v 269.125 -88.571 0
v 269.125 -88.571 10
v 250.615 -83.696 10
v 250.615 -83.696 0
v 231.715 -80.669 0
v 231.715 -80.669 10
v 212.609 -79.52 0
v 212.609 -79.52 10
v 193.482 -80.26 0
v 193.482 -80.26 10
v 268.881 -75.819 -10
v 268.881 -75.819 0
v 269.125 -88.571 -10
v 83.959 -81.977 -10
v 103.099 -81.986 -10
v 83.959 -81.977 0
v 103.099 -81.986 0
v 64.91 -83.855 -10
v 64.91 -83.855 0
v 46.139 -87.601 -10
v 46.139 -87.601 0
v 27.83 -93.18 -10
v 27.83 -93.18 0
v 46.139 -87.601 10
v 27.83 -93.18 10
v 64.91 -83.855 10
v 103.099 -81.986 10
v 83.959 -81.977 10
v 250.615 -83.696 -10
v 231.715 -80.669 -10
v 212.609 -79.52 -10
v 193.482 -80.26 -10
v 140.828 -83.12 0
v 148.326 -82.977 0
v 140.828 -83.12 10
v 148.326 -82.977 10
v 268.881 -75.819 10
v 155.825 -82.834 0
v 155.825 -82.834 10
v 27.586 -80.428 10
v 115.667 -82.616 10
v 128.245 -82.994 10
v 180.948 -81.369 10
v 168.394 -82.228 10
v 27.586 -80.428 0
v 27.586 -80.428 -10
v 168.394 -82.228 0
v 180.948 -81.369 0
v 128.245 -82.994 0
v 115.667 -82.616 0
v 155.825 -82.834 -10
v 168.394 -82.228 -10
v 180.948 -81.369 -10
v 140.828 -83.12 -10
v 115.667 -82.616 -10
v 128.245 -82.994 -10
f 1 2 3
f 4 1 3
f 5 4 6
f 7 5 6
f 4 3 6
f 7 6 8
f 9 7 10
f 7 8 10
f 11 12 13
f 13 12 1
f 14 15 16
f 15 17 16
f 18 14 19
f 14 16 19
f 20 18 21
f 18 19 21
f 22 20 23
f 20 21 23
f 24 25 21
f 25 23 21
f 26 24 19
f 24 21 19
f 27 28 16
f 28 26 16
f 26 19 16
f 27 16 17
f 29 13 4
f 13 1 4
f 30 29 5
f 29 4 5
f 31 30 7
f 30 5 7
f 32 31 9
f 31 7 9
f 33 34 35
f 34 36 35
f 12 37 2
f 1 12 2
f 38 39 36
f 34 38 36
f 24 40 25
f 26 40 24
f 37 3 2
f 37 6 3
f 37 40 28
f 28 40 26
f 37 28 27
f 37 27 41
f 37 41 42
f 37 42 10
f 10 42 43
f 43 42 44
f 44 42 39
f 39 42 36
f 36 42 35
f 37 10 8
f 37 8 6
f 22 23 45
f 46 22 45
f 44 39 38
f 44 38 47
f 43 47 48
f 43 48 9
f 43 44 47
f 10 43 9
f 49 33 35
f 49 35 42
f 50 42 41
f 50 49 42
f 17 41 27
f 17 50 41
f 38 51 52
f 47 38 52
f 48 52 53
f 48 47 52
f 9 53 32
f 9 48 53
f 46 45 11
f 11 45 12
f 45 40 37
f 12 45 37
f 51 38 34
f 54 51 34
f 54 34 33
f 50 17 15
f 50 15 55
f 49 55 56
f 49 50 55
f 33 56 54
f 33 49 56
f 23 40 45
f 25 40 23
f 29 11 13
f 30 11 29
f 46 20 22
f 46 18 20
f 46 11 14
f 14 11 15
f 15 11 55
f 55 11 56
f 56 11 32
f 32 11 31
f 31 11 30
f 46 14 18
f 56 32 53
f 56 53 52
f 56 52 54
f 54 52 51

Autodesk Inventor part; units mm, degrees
ref_plane "YZ Plane" through (0, 0, 0) normal (1, 0, 0) x (0, 1, 0)
ref_plane "XZ Plane" through (0, 0, 0) normal (0, 1, 0) x (-1, 0, 0)
ref_plane "XY Plane" through (0, 0, 0) normal (0, 0, 1) x (1, 0, 0)
sketch "Sketch1" plane through (0, 0, 0) normal (0, 0, 1) x (1, 0, 0)
  line L0 (0, 0) -> (293.4944, 0) construction
  line L1 (293.4944, 0) -> (293.4944, -132.0217) construction
  line L2 (293.4944, -132.0217) -> (0, -132.0217) construction
  line L3 (0, -132.0217) -> (0, 0) construction
  line L4 (79.3681, -56.3049) -> (159.3681, -56.3049) construction
  line L5 (283.1562, -93.1287) -> (274.2161, -88.6482) construction
  line L6 (283.1562, -93.1287) -> (282.3201, -93.1287) construction
  line L7 (18.3483, -97.5091) -> (27.4302, -93.3236) construction
  line L8 (18.3483, -97.5091) -> (20.5956, -97.5091) construction
  arc A0 (103.0994, -81.9859) -> (27.4302, -93.3236) centre (93.4367, -275.677) ccw
  arc A1 (274.2161, -88.6482) -> (204.4098, -79.893) centre (217.7822, -255.937) ccw
  arc A2 (103.0994, -81.9859) -> (204.4098, -79.893) centre (140.8276, 544.7964) ccw
  line L9 (27.4302, -93.3236) -> (27.4302, -72.2735)
  line L10 (27.4302, -72.2735) -> (272.6166, -67.591)
  line L11 (272.6166, -67.591) -> (274.2161, -88.6482)
  line L12 (103.0994, -81.9859) -> (86.3195, -71.1488) construction
  line L13 (204.4098, -79.893) -> (220.9707, -68.5773) construction
  line L14 (86.3195, -71.1488) -> (86.3195, -81.1488) construction
  line L15 (86.3195, -81.1488) -> (103.0994, -81.9859) construction
  line L16 (220.9707, -68.5773) -> (221.7303, -78.5773) construction
  line L17 (221.7303, -78.5773) -> (204.4098, -79.893) construction
  dimension "d5" = 80
  dimension "d85" = 10
  dimension "d87" = 26.619
  dimension "d92" = 10
  dimension "d94" = 24.743
  dimension "d100" = 22.985
  dimension "d101" = 22.755
  dimension "d106" = 10
  dimension "d111" = 10
  dimension "d112" = 30
  dimension "d113" = 30
extrude "Extrusion1" add sketch "Sketch1" along normal blind 10
sketch "Sketch2" plane through (0, 0, 10) normal (0, 0, 1) x (1, 0, 0)
  arc A0 (103.0994, -81.9859) -> (204.4098, -79.893) centre (140.8276, 544.7964) ccw projected
  line L0 (272.6166, -67.591) -> (27.4302, -72.2735) projected
  line L1 (27.4302, -72.2735) -> (27.4302, -93.3236) projected
  line L2 (274.2161, -88.6482) -> (272.6166, -67.591) projected
  line L3 (125.3768, -83.1204) -> (158.7723, -83.1204)
  line L4 (140.8276, -83.1204) -> (140.8276, -70.1078)
  line L5 (140.8276, -76.6141) -> (27.4302, -76.6141)
  line L6 (140.8276, -76.6141) -> (273.302, -76.6141)
  arc A1 (274.2161, -88.6482) -> (204.4098, -79.893) centre (217.7822, -255.937) ccw projected
  line L7 (274.2161, -88.6482) -> (272.6166, -67.591) projected
  line L8 (272.6166, -67.591) -> (27.4302, -72.2735) projected
  line L9 (27.4302, -72.2735) -> (27.4302, -93.3236) projected
  arc A2 (103.0994, -81.9859) -> (27.4302, -93.3236) centre (93.4367, -275.677) ccw projected
  arc A3 (103.0994, -81.9859) -> (204.4098, -79.893) centre (140.8276, 544.7964) ccw projected
  line L10 (140.8276, -83.1204) -> (140.4575, -63.7401)
  point P0 (0, 0)
  point P1 (204.4098, -79.893)
  point P2 (140.5792, -70.1126)
  point P3 (140.7034, -76.6141)
  dimension "d121" = 113.3974
  dimension "d122" = 132.4743
extrude "Extrusion2" cut sketch "Sketch2" against normal blind 10 contours L4 L6 L2 A1 A0 | L10 L5 L4 | L5 L10 L0 L4 | L4 L0 L2 L6
sketch "Sketch4" plane through (0, 0, 10) normal (0, 0, 1) x (1, 0, 0)
  line L0 (140.5792, -70.1126) -> (27.4302, -72.2735) projected
  line L1 (27.4302, -72.2735) -> (27.4302, -93.3236) projected
  arc A0 (103.0994, -81.9859) -> (27.4302, -93.3236) centre (93.4367, -275.677) ccw projected
  arc A1 (103.0994, -81.9859) -> (140.8276, -83.1204) centre (140.8276, 544.7964) ccw projected
  line L2 (27.4302, -72.2735) -> (27.4302, -93.3236) projected
  arc A2 (103.0994, -81.9859) -> (27.4302, -93.3236) centre (93.4367, -275.677) ccw projected
  line L3 (27.4302, -72.2735) -> (27.8295, -93.1796)
  line L4 (140.8276, -83.1204) -> (140.5792, -70.1126) projected
  point P0 (0, 0)
  point P1 (253.7282, -67.9517)
  dimension "d128" = 90
extrude "Extrusion4" cut sketch "Sketch4" against normal blind 10 contours L3 A0 L1
sketch "Sketch6" plane through (0, 0, 10) normal (0, 0, 1) x (1, 0, 0)
  line L0 (27.4302, -72.2735) -> (27.8295, -93.1796) projected
  arc A0 (103.0994, -81.9859) -> (27.8295, -93.1796) centre (93.4367, -275.677) ccw projected
  arc A1 (103.0994, -81.9859) -> (140.8276, -83.1204) centre (140.8276, 544.7964) ccw projected
  line L1 (140.8276, -83.1204) -> (140.5792, -70.1126) projected
  line L2 (140.5792, -70.1126) -> (27.4302, -72.2735) projected
  line L3 (140.5792, -70.1126) -> (27.4302, -72.2735) projected
  line L4 (140.5792, -70.1126) -> (148.0778, -69.9694)
  line L5 (148.0778, -69.9694) -> (148.3263, -82.9772)
  line L6 (140.5792, -70.1126) -> (140.8276, -83.1204) projected
  line L7 (148.3263, -82.9772) -> (140.8276, -83.1204)
  point P0 (0, 0)
  dimension "d131" = 7.5
  dimension "d132" = 0
  dimension "d135" = 180
extrude "Extrusion5" add sketch "Sketch6" against normal blind 10 contours L4 L5 L7 L1
sketch "Sketch7" plane through (0, 0, 10) normal (0, 0, 1) x (1, 0, 0)
  line L0 (27.4302, -72.2735) -> (27.8295, -93.1796) projected
  arc A0 (103.0994, -81.9859) -> (27.8295, -93.1796) centre (93.4367, -275.677) ccw projected
  arc A1 (103.0994, -81.9859) -> (140.8276, -83.1204) centre (140.8276, 544.7964) ccw projected
  line L1 (140.8276, -83.1204) -> (148.3263, -82.9772) projected
  line L2 (148.3263, -82.9772) -> (148.0778, -69.9694) projected
  line L3 (148.0778, -69.9694) -> (27.4302, -72.2735) projected
  line L4 (268.7255, -67.6653) -> (269.1247, -88.5714)
  arc A2 (269.1247, -88.5714) -> (193.4823, -80.2598) centre (210.5334, -273.4407) ccw
  arc A3 (155.8249, -82.834) -> (193.4823, -80.2598) centre (131.8501, 544.6249) ccw
  line L5 (155.8249, -82.834) -> (148.3263, -82.9772)
  line L6 (148.0778, -69.9694) -> (268.7255, -67.6653)
  point P0 (0, 0)
extrude "Extrusion6" add sketch "Sketch7" against normal blind 10 contours L6 L4 A2 A3 L5 L2
sketch "Sketch8" plane through (0, 0, 10) normal (0, 0, 1) x (1, 0, 0)
  line L0 (27.4302, -72.2735) -> (27.8295, -93.1796) projected
  arc A0 (103.0994, -81.9859) -> (27.8295, -93.1796) centre (93.4367, -275.677) ccw projected
  arc A1 (103.0994, -81.9859) -> (140.8276, -83.1204) centre (140.8276, 544.7964) ccw projected
  line L1 (140.8276, -83.1204) -> (155.8249, -82.834) projected
  arc A2 (155.8249, -82.834) -> (193.4823, -80.2598) centre (131.8501, 544.6249) ccw projected
  arc A3 (269.1247, -88.5714) -> (193.4823, -80.2598) centre (210.5334, -273.4407) ccw projected
  line L2 (269.1247, -88.5714) -> (268.7255, -67.6653) projected
  line L3 (268.7255, -67.6653) -> (27.4302, -72.2735) projected
  line L4 (27.8295, -93.1796) -> (27.4302, -72.2735) projected
  line L5 (268.7255, -67.6653) -> (269.1247, -88.5714) projected
  line L6 (27.5859, -80.4275) -> (268.8812, -75.8193)
  point P0 (0, 0)
  dimension "d138" = 3
extrude "Extrusion7" cut sketch "Sketch8" against normal blind 10 contours L3 L2 L6 L0
sketch "Sketch9" plane through (0, 0, 0) normal (0, 0, -1) x (-1, 0, 0)
  line L0 (-27.5859, -80.4275) -> (-268.8812, -75.8193) projected
  line L1 (-268.8812, -75.8193) -> (-269.1247, -88.5714) projected
  arc A0 (-193.4823, -80.2598) -> (-269.1247, -88.5714) centre (-210.5334, -273.4407) ccw projected
  arc A1 (-193.4823, -80.2598) -> (-155.8249, -82.834) centre (-131.8501, 544.6249) ccw projected
  line L2 (-155.8249, -82.834) -> (-140.8276, -83.1204) projected
  arc A2 (-140.8276, -83.1204) -> (-103.0994, -81.9859) centre (-140.8276, 544.7964) ccw projected
  arc A3 (-27.8295, -93.1796) -> (-103.0994, -81.9859) centre (-93.4367, -275.677) ccw projected
  line L3 (-27.8295, -93.1796) -> (-27.5859, -80.4275) projected
  point P0 (0, 0)
extrude "Extrusion8" add sketch "Sketch9" along normal blind 10
equation "\"d111\" = d106"
equation "\"d113\" = d112"
properties part number "deseczka_dol_check - 6"
